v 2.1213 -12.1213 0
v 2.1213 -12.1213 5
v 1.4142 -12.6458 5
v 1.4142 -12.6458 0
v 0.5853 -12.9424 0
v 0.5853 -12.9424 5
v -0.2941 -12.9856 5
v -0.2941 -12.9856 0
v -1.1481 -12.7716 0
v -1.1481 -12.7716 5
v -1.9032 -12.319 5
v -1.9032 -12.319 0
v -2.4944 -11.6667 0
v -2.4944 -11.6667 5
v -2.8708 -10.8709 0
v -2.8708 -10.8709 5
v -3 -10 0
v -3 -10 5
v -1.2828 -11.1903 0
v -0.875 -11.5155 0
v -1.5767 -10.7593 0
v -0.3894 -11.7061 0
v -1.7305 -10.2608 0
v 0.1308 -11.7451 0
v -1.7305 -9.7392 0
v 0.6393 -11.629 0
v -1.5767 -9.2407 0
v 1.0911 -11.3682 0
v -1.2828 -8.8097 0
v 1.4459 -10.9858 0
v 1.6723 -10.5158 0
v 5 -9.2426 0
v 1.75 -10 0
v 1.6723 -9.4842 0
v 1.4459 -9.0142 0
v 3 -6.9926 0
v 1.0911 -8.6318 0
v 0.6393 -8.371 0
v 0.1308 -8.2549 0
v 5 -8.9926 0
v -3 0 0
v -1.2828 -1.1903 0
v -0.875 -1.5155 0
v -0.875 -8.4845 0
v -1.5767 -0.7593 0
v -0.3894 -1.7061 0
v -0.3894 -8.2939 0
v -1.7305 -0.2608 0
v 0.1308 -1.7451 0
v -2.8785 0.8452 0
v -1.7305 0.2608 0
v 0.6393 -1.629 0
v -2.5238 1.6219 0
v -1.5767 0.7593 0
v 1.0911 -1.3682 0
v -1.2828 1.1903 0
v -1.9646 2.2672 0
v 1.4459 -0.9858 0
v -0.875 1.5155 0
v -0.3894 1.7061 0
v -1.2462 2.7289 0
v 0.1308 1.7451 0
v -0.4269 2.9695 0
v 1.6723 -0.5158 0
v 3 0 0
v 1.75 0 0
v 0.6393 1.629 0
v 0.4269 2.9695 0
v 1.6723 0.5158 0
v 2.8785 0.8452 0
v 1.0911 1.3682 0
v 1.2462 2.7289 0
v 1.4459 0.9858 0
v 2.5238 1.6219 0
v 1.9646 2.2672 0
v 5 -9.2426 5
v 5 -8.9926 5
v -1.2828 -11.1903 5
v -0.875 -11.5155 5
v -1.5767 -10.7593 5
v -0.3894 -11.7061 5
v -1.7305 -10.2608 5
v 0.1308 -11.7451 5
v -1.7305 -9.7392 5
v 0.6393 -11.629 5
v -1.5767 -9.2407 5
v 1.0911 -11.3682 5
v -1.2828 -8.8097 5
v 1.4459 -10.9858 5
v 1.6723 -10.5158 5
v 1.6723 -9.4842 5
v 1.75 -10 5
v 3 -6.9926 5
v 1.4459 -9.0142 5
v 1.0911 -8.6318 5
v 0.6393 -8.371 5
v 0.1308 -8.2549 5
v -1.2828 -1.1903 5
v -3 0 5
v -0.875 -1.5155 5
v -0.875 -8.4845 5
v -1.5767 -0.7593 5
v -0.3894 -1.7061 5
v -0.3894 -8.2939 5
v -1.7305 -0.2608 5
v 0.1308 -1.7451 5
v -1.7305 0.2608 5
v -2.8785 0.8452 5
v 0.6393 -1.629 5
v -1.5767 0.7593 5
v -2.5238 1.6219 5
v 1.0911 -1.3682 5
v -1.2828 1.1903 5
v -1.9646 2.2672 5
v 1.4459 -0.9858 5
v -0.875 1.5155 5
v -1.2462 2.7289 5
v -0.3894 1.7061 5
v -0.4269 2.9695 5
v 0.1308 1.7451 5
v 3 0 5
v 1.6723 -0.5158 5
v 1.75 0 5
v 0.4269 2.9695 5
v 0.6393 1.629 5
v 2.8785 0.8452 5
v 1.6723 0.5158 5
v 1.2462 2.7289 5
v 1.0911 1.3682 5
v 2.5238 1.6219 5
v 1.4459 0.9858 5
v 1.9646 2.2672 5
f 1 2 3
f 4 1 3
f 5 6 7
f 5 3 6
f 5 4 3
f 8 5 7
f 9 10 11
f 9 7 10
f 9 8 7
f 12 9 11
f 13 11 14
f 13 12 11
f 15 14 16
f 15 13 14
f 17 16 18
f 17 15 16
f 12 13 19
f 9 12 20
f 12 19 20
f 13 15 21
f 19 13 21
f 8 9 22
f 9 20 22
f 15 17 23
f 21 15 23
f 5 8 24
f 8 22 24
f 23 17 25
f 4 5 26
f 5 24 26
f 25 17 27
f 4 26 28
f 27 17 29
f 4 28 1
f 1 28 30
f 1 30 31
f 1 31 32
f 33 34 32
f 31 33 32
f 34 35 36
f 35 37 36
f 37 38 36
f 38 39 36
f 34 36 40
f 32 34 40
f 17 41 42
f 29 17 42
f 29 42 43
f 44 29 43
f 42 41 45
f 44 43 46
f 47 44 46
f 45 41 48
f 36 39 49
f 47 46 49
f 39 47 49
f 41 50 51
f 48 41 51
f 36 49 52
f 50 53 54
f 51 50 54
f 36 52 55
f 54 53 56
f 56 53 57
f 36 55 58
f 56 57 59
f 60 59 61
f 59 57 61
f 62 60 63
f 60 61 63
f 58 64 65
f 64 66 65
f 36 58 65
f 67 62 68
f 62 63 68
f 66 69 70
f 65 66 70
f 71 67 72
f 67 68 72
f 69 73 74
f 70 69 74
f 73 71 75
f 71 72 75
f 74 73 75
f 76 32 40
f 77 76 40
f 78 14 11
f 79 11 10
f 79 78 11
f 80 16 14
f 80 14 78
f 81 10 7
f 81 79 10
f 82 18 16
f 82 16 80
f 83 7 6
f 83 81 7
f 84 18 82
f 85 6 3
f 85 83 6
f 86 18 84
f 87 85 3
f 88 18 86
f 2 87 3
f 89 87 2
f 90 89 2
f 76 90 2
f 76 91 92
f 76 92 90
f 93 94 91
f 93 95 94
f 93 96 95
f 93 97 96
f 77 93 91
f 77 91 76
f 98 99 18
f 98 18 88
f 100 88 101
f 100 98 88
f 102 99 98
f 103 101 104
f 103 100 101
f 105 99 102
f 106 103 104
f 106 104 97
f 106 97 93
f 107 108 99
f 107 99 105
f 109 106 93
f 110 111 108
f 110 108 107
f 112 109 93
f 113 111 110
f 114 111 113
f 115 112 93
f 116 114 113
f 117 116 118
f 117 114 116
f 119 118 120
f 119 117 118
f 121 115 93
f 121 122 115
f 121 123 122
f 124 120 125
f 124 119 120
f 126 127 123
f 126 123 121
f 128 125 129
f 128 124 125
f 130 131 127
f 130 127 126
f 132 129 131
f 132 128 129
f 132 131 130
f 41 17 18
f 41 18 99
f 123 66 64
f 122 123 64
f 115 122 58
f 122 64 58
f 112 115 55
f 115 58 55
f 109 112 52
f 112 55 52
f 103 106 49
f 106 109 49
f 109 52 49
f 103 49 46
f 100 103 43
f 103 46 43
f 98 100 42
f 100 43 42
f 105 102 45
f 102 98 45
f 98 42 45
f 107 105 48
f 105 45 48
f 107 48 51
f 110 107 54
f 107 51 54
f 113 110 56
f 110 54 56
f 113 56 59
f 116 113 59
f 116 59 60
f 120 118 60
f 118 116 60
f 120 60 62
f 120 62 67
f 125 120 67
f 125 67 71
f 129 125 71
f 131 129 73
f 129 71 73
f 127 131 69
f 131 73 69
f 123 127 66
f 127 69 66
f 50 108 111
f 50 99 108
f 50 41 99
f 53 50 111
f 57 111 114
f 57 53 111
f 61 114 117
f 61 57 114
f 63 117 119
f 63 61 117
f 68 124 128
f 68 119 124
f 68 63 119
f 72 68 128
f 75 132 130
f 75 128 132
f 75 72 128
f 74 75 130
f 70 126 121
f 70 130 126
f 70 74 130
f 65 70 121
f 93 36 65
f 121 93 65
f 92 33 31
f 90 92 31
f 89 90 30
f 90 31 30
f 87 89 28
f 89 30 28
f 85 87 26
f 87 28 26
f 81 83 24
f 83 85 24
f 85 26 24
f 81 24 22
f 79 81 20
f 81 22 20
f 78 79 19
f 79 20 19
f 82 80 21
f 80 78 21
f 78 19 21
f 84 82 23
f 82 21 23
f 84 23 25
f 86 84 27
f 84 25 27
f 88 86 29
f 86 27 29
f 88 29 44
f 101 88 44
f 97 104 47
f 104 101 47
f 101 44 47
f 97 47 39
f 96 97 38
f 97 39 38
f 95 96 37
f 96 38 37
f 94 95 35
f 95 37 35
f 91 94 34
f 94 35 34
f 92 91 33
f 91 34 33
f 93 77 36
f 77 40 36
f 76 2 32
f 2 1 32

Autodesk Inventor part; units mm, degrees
ref_plane "YZ Plane" through (0, 0, 0) normal (1, 0, 0) x (0, 1, 0)
ref_plane "XZ Plane" through (0, 0, 0) normal (0, 1, 0) x (-1, 0, 0)
ref_plane "XY Plane" through (0, 0, 0) normal (0, 0, 1) x (1, 0, 0)
sketch "Sketch1" plane through (0, 0, 0) normal (0, 0, 1) x (1, 0, 0)
  circle A0 centre (0, 0) radius 1.75
  circle A1 centre (0, -10) radius 1.75
  arc A2 (-3, -10) -> (3, -10) centre (0, -10) ccw
  arc A3 (3, 0) -> (-3, 0) centre (0, 0) ccw
  line L0 (-3, -10) -> (-3, 0)
  line L1 (3, -10) -> (3, 0)
  line L2 (2.1213, -12.1213) -> (5, -9.2426)
  line L3 (2.1213, -12.1213) -> (4.3055, -12.1213) construction
  line L4 (5, -9.2426) -> (5, -8.9926)
  line L5 (5, -8.9926) -> (3, -6.9926)
  point P0 (3, -7.757)
  dimension "d0" = 3.5
  dimension "d1" = 3.5
  dimension "d2" = 6
  dimension "d3" = 6
  dimension "d6" = 45
  dimension "d10" = 5
  dimension "d11" = 0.25
  dimension "d12" = 135
extrude "Extrusion1" add sketch "Sketch1" along normal blind 5
properties part number "mellemStykke"
